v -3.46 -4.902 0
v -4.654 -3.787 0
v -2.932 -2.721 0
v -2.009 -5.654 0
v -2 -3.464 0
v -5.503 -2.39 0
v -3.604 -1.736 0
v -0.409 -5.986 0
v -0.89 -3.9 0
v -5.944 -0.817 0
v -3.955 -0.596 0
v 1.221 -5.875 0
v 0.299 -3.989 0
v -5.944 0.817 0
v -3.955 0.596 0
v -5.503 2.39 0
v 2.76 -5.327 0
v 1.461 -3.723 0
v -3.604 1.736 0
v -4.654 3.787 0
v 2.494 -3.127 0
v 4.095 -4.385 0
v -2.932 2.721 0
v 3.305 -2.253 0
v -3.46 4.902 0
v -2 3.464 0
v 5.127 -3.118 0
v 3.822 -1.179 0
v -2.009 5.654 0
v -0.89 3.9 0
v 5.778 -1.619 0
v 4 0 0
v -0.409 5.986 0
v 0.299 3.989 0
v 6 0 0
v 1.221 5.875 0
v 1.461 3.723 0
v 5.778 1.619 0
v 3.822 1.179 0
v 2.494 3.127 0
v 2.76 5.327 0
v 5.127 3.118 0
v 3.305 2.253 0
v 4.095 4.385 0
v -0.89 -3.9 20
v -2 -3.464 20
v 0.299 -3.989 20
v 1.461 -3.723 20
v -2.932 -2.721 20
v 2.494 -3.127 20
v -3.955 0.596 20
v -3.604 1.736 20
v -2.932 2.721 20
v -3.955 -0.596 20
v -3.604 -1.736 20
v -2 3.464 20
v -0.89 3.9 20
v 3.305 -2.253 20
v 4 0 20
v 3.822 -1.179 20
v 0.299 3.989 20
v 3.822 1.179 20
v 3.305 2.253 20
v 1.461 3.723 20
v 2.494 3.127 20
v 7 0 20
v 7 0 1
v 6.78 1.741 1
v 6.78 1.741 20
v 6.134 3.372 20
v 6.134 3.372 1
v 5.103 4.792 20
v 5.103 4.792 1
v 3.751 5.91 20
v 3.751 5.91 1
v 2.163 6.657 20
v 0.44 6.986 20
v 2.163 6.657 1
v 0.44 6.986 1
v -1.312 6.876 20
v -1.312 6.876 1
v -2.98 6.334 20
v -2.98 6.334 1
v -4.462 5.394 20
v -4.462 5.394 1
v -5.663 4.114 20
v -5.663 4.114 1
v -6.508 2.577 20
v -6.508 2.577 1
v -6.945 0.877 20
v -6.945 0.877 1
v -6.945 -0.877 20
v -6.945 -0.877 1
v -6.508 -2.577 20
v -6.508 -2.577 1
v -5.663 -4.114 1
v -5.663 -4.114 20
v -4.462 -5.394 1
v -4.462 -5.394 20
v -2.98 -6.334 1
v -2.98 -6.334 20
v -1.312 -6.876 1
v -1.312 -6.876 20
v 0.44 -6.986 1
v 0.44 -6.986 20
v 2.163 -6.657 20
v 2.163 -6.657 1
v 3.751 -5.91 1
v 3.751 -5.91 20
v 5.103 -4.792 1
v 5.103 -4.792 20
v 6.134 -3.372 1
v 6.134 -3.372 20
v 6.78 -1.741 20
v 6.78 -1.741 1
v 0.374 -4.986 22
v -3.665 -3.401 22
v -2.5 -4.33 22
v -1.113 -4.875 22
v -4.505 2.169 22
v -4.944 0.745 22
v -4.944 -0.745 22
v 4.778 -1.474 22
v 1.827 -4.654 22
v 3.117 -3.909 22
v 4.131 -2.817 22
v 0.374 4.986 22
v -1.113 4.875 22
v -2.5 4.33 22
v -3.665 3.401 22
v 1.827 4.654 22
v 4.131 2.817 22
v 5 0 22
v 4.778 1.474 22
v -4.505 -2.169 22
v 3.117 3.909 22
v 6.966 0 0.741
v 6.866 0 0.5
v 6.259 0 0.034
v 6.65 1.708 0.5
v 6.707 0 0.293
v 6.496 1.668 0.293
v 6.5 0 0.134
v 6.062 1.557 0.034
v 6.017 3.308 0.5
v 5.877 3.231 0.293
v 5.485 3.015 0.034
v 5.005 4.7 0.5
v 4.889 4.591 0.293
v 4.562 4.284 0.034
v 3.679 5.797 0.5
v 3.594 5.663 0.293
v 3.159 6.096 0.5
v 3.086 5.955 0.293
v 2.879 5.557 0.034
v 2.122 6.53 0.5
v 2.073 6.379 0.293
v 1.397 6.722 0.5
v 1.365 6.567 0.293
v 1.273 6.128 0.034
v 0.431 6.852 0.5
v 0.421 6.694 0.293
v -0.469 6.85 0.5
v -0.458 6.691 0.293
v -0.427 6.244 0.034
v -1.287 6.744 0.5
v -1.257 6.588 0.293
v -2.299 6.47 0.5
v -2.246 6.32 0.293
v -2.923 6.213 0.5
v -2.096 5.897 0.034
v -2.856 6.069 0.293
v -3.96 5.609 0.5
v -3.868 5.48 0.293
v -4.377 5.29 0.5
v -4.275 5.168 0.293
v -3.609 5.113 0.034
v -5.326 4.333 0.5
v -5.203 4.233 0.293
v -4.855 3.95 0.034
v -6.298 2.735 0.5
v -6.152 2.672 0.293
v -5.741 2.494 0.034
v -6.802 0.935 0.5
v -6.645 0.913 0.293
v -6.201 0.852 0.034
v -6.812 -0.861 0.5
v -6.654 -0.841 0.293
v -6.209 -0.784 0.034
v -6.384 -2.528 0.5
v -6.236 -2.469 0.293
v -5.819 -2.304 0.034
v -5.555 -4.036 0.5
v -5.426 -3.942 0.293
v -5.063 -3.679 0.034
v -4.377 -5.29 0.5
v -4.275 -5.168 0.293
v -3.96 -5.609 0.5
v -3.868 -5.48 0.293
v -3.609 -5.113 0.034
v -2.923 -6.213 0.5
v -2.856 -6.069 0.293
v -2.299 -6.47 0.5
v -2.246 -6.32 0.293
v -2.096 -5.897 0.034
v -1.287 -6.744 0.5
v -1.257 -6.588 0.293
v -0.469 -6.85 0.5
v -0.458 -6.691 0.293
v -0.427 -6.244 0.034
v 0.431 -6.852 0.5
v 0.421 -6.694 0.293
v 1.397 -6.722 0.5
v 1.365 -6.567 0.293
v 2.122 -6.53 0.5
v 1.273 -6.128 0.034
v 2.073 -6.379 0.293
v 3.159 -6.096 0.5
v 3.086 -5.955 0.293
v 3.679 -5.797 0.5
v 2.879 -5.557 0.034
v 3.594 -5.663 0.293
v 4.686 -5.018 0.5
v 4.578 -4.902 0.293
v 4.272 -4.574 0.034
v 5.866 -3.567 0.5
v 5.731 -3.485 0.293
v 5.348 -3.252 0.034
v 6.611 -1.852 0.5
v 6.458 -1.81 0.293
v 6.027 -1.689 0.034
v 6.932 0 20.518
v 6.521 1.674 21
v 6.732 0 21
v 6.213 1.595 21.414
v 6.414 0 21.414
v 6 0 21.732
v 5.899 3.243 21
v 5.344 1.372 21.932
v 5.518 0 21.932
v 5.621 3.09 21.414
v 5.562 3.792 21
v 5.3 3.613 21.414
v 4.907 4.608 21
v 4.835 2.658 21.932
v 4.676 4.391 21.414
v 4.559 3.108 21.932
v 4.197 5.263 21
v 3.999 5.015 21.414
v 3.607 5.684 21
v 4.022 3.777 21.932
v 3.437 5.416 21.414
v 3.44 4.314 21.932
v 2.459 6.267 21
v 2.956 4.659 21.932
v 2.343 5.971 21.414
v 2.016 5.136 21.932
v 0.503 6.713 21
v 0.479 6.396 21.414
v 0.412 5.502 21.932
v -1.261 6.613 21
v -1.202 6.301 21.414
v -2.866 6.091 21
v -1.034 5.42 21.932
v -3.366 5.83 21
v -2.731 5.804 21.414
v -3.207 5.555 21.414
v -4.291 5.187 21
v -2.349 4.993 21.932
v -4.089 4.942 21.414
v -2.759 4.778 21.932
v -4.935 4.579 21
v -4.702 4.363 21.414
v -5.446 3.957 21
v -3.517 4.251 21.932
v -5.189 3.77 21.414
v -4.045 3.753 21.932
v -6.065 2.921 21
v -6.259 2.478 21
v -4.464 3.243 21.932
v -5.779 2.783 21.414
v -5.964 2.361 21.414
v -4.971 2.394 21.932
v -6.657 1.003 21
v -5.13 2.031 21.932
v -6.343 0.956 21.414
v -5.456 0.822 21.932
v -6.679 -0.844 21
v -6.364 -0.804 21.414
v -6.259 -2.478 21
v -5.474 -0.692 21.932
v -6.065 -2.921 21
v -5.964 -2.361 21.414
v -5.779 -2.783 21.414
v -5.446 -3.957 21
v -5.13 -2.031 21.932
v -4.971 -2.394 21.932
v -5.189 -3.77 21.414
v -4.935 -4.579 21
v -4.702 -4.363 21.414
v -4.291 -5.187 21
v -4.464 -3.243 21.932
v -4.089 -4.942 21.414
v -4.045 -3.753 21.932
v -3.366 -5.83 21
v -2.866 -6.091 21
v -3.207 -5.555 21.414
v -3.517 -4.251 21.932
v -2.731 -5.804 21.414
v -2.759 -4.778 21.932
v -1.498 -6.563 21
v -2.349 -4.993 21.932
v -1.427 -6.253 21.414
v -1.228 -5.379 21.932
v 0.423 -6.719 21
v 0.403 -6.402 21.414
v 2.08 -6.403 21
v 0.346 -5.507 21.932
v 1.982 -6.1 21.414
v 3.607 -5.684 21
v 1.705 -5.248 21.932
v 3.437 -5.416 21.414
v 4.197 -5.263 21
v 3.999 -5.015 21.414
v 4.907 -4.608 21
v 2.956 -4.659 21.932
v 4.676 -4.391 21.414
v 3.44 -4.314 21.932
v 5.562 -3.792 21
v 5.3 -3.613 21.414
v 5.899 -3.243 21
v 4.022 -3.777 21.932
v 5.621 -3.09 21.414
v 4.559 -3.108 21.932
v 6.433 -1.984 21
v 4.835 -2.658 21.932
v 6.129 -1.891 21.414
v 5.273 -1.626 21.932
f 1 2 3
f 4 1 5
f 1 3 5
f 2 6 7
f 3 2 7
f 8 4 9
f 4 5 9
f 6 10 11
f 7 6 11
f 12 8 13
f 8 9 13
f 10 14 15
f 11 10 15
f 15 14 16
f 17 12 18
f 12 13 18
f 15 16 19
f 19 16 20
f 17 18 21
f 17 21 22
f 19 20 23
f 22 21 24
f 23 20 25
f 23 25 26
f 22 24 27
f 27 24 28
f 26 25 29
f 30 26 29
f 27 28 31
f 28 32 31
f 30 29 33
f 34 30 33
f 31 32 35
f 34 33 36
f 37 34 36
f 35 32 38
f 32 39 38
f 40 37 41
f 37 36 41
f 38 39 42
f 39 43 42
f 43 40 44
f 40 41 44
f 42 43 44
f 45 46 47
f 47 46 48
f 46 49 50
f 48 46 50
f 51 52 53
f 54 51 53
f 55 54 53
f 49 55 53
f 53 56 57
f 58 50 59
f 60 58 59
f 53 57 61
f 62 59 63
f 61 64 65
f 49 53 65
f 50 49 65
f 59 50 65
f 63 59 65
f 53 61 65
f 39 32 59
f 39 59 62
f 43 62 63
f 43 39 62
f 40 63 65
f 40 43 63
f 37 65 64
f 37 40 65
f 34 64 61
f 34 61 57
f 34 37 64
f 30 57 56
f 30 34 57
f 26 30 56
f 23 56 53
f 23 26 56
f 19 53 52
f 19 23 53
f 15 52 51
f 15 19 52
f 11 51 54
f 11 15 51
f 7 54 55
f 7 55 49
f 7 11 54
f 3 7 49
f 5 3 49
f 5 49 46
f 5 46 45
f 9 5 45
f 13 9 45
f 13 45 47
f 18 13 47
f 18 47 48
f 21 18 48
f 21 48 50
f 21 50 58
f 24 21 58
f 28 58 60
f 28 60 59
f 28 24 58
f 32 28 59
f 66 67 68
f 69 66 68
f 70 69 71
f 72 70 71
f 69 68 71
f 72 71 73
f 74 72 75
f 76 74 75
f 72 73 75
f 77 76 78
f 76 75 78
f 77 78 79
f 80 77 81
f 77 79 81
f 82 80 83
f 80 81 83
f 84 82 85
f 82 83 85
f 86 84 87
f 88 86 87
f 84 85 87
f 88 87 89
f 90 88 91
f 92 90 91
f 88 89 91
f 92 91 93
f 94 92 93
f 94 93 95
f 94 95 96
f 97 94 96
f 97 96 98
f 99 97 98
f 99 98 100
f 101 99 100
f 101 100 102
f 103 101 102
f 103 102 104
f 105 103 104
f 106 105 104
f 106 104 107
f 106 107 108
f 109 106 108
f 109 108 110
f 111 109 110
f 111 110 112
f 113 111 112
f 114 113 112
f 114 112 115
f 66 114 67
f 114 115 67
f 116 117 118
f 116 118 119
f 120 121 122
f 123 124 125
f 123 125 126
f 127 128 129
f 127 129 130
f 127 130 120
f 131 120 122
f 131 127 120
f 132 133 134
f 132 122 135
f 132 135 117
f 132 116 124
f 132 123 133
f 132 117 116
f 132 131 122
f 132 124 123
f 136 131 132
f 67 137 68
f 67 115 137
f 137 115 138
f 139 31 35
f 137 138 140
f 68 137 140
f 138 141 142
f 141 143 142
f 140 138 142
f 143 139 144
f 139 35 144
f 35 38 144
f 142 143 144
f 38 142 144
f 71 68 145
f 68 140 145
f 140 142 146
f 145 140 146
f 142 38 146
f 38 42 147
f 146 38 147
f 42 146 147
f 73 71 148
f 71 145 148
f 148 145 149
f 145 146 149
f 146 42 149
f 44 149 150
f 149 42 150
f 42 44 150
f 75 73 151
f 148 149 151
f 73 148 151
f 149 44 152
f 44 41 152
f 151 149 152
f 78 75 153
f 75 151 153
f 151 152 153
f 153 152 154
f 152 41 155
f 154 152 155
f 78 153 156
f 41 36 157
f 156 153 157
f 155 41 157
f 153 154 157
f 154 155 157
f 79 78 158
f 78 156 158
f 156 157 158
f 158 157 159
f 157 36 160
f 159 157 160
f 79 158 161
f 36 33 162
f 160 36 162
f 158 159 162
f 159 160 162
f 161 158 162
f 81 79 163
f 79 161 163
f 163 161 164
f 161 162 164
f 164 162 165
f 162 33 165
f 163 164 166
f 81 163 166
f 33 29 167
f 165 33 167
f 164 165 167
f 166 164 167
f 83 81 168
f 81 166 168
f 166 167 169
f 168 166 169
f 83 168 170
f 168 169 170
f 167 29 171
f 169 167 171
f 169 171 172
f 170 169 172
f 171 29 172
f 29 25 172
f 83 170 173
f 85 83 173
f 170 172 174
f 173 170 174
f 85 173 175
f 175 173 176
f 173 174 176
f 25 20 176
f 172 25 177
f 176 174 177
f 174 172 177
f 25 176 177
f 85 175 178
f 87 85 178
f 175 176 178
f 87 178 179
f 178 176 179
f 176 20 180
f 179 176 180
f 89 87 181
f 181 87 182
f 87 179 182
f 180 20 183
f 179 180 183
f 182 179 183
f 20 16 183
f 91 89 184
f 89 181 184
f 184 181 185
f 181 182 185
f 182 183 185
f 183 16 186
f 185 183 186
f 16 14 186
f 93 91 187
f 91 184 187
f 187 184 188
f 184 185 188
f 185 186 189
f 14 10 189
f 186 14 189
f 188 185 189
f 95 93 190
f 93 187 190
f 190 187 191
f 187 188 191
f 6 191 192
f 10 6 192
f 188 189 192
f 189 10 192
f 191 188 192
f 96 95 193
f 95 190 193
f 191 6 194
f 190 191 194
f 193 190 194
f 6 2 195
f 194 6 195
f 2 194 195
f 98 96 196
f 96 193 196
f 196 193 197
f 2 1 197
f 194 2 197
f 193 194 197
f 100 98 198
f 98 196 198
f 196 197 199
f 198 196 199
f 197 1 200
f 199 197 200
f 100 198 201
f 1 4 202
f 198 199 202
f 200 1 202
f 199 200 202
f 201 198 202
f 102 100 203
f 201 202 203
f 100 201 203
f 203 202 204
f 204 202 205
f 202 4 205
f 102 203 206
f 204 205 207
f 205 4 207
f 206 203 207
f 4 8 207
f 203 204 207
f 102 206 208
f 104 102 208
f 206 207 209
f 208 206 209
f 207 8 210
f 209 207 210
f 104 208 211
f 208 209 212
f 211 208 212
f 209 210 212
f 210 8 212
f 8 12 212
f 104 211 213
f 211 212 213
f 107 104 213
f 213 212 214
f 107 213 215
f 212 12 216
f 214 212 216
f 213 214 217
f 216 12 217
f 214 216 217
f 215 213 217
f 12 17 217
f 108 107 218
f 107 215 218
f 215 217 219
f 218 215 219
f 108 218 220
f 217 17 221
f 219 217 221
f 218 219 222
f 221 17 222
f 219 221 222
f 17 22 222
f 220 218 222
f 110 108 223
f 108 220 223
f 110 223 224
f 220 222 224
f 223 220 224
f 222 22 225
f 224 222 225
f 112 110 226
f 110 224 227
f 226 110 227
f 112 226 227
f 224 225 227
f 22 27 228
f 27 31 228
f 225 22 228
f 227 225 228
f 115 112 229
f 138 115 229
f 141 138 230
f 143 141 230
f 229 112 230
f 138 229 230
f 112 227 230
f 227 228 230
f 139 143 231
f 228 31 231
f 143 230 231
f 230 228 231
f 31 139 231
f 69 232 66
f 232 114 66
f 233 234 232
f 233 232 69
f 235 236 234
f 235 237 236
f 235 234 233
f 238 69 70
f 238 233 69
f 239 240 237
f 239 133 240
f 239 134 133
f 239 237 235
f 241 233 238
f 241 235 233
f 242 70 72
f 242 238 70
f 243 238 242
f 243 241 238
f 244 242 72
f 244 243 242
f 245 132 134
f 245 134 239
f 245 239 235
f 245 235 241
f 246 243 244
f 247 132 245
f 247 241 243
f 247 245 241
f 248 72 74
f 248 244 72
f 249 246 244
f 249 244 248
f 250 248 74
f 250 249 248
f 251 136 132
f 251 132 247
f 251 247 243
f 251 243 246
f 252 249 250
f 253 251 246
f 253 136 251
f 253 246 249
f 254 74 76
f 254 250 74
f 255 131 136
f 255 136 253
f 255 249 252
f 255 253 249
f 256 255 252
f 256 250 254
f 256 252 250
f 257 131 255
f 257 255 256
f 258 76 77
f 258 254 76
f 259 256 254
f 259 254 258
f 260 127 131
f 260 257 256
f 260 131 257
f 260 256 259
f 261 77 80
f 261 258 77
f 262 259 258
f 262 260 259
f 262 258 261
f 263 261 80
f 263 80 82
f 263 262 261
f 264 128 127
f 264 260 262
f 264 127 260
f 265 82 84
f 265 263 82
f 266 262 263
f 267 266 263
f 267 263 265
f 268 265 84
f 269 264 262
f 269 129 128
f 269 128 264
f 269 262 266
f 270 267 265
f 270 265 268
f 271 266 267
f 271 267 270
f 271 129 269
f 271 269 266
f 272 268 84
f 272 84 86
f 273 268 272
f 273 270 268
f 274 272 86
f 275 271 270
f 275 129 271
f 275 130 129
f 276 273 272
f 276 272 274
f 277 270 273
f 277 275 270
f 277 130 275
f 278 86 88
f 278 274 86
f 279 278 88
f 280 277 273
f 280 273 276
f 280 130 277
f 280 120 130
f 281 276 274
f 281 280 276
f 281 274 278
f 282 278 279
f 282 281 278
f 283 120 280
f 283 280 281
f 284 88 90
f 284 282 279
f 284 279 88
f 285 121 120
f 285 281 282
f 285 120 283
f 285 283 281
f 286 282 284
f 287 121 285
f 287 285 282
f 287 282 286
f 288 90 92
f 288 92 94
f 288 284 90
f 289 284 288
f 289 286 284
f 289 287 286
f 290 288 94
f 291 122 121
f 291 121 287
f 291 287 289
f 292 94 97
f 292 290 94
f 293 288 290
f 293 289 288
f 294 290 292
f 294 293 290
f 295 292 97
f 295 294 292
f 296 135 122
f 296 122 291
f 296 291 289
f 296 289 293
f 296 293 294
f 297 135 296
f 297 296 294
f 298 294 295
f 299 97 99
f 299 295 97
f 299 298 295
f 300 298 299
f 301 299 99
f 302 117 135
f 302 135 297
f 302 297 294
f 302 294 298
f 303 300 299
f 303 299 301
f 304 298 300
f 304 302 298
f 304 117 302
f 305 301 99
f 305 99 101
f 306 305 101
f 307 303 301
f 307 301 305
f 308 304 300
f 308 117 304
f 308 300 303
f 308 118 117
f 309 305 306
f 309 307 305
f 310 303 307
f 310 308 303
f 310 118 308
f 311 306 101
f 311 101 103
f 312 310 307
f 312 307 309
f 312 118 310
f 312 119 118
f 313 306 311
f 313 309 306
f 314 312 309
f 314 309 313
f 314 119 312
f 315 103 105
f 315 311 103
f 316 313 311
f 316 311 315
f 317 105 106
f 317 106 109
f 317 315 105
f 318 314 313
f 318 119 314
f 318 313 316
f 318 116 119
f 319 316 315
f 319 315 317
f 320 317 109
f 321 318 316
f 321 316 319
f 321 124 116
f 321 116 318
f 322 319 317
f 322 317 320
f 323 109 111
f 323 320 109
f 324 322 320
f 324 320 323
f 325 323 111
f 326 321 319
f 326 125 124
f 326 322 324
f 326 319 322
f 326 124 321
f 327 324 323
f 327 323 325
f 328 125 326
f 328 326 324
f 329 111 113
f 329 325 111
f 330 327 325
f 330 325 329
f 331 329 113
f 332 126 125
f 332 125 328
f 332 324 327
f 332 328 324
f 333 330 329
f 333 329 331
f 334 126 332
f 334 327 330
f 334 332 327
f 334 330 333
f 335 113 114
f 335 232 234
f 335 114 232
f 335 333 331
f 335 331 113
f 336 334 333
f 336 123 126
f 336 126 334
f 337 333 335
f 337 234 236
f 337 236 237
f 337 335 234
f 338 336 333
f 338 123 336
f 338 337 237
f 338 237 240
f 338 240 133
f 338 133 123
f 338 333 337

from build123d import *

# Parameters (mm, degrees)
SKETCH1_R           = 7
SKETCH1_R_2         = 4
BOSS_EXTRUDE1_DEPTH = 20
SKETCH2_R           = 7
BOSS_EXTRUDE2_DEPTH = 2
FILLET1_R           = 2
FILLET2_R           = 1


with BuildPart() as part:
    # Sketch1 → Boss-Extrude1 (new body)
    with BuildSketch(Plane.XY):
        Circle(SKETCH1_R)
        Circle(SKETCH1_R_2, mode=Mode.SUBTRACT)
    extrude(amount=BOSS_EXTRUDE1_DEPTH)

    # Sketch2 → Boss-Extrude2 (add)
    with BuildSketch(Plane.XY.offset(20)):
        Circle(SKETCH2_R)
    extrude(amount=BOSS_EXTRUDE2_DEPTH)

    # Fillet1
    fillet1_edges = [part.edges().sort_by_distance(p)[0] for p in [
        (-7, 0, 22),
    ]]
    fillet(fillet1_edges, radius=FILLET1_R)

    # Fillet2
    fillet2_edges = [part.edges().sort_by_distance(p)[0] for p in [
        (-7, 0, 0),
    ]]
    fillet(fillet2_edges, radius=FILLET2_R)


solid = part.part
